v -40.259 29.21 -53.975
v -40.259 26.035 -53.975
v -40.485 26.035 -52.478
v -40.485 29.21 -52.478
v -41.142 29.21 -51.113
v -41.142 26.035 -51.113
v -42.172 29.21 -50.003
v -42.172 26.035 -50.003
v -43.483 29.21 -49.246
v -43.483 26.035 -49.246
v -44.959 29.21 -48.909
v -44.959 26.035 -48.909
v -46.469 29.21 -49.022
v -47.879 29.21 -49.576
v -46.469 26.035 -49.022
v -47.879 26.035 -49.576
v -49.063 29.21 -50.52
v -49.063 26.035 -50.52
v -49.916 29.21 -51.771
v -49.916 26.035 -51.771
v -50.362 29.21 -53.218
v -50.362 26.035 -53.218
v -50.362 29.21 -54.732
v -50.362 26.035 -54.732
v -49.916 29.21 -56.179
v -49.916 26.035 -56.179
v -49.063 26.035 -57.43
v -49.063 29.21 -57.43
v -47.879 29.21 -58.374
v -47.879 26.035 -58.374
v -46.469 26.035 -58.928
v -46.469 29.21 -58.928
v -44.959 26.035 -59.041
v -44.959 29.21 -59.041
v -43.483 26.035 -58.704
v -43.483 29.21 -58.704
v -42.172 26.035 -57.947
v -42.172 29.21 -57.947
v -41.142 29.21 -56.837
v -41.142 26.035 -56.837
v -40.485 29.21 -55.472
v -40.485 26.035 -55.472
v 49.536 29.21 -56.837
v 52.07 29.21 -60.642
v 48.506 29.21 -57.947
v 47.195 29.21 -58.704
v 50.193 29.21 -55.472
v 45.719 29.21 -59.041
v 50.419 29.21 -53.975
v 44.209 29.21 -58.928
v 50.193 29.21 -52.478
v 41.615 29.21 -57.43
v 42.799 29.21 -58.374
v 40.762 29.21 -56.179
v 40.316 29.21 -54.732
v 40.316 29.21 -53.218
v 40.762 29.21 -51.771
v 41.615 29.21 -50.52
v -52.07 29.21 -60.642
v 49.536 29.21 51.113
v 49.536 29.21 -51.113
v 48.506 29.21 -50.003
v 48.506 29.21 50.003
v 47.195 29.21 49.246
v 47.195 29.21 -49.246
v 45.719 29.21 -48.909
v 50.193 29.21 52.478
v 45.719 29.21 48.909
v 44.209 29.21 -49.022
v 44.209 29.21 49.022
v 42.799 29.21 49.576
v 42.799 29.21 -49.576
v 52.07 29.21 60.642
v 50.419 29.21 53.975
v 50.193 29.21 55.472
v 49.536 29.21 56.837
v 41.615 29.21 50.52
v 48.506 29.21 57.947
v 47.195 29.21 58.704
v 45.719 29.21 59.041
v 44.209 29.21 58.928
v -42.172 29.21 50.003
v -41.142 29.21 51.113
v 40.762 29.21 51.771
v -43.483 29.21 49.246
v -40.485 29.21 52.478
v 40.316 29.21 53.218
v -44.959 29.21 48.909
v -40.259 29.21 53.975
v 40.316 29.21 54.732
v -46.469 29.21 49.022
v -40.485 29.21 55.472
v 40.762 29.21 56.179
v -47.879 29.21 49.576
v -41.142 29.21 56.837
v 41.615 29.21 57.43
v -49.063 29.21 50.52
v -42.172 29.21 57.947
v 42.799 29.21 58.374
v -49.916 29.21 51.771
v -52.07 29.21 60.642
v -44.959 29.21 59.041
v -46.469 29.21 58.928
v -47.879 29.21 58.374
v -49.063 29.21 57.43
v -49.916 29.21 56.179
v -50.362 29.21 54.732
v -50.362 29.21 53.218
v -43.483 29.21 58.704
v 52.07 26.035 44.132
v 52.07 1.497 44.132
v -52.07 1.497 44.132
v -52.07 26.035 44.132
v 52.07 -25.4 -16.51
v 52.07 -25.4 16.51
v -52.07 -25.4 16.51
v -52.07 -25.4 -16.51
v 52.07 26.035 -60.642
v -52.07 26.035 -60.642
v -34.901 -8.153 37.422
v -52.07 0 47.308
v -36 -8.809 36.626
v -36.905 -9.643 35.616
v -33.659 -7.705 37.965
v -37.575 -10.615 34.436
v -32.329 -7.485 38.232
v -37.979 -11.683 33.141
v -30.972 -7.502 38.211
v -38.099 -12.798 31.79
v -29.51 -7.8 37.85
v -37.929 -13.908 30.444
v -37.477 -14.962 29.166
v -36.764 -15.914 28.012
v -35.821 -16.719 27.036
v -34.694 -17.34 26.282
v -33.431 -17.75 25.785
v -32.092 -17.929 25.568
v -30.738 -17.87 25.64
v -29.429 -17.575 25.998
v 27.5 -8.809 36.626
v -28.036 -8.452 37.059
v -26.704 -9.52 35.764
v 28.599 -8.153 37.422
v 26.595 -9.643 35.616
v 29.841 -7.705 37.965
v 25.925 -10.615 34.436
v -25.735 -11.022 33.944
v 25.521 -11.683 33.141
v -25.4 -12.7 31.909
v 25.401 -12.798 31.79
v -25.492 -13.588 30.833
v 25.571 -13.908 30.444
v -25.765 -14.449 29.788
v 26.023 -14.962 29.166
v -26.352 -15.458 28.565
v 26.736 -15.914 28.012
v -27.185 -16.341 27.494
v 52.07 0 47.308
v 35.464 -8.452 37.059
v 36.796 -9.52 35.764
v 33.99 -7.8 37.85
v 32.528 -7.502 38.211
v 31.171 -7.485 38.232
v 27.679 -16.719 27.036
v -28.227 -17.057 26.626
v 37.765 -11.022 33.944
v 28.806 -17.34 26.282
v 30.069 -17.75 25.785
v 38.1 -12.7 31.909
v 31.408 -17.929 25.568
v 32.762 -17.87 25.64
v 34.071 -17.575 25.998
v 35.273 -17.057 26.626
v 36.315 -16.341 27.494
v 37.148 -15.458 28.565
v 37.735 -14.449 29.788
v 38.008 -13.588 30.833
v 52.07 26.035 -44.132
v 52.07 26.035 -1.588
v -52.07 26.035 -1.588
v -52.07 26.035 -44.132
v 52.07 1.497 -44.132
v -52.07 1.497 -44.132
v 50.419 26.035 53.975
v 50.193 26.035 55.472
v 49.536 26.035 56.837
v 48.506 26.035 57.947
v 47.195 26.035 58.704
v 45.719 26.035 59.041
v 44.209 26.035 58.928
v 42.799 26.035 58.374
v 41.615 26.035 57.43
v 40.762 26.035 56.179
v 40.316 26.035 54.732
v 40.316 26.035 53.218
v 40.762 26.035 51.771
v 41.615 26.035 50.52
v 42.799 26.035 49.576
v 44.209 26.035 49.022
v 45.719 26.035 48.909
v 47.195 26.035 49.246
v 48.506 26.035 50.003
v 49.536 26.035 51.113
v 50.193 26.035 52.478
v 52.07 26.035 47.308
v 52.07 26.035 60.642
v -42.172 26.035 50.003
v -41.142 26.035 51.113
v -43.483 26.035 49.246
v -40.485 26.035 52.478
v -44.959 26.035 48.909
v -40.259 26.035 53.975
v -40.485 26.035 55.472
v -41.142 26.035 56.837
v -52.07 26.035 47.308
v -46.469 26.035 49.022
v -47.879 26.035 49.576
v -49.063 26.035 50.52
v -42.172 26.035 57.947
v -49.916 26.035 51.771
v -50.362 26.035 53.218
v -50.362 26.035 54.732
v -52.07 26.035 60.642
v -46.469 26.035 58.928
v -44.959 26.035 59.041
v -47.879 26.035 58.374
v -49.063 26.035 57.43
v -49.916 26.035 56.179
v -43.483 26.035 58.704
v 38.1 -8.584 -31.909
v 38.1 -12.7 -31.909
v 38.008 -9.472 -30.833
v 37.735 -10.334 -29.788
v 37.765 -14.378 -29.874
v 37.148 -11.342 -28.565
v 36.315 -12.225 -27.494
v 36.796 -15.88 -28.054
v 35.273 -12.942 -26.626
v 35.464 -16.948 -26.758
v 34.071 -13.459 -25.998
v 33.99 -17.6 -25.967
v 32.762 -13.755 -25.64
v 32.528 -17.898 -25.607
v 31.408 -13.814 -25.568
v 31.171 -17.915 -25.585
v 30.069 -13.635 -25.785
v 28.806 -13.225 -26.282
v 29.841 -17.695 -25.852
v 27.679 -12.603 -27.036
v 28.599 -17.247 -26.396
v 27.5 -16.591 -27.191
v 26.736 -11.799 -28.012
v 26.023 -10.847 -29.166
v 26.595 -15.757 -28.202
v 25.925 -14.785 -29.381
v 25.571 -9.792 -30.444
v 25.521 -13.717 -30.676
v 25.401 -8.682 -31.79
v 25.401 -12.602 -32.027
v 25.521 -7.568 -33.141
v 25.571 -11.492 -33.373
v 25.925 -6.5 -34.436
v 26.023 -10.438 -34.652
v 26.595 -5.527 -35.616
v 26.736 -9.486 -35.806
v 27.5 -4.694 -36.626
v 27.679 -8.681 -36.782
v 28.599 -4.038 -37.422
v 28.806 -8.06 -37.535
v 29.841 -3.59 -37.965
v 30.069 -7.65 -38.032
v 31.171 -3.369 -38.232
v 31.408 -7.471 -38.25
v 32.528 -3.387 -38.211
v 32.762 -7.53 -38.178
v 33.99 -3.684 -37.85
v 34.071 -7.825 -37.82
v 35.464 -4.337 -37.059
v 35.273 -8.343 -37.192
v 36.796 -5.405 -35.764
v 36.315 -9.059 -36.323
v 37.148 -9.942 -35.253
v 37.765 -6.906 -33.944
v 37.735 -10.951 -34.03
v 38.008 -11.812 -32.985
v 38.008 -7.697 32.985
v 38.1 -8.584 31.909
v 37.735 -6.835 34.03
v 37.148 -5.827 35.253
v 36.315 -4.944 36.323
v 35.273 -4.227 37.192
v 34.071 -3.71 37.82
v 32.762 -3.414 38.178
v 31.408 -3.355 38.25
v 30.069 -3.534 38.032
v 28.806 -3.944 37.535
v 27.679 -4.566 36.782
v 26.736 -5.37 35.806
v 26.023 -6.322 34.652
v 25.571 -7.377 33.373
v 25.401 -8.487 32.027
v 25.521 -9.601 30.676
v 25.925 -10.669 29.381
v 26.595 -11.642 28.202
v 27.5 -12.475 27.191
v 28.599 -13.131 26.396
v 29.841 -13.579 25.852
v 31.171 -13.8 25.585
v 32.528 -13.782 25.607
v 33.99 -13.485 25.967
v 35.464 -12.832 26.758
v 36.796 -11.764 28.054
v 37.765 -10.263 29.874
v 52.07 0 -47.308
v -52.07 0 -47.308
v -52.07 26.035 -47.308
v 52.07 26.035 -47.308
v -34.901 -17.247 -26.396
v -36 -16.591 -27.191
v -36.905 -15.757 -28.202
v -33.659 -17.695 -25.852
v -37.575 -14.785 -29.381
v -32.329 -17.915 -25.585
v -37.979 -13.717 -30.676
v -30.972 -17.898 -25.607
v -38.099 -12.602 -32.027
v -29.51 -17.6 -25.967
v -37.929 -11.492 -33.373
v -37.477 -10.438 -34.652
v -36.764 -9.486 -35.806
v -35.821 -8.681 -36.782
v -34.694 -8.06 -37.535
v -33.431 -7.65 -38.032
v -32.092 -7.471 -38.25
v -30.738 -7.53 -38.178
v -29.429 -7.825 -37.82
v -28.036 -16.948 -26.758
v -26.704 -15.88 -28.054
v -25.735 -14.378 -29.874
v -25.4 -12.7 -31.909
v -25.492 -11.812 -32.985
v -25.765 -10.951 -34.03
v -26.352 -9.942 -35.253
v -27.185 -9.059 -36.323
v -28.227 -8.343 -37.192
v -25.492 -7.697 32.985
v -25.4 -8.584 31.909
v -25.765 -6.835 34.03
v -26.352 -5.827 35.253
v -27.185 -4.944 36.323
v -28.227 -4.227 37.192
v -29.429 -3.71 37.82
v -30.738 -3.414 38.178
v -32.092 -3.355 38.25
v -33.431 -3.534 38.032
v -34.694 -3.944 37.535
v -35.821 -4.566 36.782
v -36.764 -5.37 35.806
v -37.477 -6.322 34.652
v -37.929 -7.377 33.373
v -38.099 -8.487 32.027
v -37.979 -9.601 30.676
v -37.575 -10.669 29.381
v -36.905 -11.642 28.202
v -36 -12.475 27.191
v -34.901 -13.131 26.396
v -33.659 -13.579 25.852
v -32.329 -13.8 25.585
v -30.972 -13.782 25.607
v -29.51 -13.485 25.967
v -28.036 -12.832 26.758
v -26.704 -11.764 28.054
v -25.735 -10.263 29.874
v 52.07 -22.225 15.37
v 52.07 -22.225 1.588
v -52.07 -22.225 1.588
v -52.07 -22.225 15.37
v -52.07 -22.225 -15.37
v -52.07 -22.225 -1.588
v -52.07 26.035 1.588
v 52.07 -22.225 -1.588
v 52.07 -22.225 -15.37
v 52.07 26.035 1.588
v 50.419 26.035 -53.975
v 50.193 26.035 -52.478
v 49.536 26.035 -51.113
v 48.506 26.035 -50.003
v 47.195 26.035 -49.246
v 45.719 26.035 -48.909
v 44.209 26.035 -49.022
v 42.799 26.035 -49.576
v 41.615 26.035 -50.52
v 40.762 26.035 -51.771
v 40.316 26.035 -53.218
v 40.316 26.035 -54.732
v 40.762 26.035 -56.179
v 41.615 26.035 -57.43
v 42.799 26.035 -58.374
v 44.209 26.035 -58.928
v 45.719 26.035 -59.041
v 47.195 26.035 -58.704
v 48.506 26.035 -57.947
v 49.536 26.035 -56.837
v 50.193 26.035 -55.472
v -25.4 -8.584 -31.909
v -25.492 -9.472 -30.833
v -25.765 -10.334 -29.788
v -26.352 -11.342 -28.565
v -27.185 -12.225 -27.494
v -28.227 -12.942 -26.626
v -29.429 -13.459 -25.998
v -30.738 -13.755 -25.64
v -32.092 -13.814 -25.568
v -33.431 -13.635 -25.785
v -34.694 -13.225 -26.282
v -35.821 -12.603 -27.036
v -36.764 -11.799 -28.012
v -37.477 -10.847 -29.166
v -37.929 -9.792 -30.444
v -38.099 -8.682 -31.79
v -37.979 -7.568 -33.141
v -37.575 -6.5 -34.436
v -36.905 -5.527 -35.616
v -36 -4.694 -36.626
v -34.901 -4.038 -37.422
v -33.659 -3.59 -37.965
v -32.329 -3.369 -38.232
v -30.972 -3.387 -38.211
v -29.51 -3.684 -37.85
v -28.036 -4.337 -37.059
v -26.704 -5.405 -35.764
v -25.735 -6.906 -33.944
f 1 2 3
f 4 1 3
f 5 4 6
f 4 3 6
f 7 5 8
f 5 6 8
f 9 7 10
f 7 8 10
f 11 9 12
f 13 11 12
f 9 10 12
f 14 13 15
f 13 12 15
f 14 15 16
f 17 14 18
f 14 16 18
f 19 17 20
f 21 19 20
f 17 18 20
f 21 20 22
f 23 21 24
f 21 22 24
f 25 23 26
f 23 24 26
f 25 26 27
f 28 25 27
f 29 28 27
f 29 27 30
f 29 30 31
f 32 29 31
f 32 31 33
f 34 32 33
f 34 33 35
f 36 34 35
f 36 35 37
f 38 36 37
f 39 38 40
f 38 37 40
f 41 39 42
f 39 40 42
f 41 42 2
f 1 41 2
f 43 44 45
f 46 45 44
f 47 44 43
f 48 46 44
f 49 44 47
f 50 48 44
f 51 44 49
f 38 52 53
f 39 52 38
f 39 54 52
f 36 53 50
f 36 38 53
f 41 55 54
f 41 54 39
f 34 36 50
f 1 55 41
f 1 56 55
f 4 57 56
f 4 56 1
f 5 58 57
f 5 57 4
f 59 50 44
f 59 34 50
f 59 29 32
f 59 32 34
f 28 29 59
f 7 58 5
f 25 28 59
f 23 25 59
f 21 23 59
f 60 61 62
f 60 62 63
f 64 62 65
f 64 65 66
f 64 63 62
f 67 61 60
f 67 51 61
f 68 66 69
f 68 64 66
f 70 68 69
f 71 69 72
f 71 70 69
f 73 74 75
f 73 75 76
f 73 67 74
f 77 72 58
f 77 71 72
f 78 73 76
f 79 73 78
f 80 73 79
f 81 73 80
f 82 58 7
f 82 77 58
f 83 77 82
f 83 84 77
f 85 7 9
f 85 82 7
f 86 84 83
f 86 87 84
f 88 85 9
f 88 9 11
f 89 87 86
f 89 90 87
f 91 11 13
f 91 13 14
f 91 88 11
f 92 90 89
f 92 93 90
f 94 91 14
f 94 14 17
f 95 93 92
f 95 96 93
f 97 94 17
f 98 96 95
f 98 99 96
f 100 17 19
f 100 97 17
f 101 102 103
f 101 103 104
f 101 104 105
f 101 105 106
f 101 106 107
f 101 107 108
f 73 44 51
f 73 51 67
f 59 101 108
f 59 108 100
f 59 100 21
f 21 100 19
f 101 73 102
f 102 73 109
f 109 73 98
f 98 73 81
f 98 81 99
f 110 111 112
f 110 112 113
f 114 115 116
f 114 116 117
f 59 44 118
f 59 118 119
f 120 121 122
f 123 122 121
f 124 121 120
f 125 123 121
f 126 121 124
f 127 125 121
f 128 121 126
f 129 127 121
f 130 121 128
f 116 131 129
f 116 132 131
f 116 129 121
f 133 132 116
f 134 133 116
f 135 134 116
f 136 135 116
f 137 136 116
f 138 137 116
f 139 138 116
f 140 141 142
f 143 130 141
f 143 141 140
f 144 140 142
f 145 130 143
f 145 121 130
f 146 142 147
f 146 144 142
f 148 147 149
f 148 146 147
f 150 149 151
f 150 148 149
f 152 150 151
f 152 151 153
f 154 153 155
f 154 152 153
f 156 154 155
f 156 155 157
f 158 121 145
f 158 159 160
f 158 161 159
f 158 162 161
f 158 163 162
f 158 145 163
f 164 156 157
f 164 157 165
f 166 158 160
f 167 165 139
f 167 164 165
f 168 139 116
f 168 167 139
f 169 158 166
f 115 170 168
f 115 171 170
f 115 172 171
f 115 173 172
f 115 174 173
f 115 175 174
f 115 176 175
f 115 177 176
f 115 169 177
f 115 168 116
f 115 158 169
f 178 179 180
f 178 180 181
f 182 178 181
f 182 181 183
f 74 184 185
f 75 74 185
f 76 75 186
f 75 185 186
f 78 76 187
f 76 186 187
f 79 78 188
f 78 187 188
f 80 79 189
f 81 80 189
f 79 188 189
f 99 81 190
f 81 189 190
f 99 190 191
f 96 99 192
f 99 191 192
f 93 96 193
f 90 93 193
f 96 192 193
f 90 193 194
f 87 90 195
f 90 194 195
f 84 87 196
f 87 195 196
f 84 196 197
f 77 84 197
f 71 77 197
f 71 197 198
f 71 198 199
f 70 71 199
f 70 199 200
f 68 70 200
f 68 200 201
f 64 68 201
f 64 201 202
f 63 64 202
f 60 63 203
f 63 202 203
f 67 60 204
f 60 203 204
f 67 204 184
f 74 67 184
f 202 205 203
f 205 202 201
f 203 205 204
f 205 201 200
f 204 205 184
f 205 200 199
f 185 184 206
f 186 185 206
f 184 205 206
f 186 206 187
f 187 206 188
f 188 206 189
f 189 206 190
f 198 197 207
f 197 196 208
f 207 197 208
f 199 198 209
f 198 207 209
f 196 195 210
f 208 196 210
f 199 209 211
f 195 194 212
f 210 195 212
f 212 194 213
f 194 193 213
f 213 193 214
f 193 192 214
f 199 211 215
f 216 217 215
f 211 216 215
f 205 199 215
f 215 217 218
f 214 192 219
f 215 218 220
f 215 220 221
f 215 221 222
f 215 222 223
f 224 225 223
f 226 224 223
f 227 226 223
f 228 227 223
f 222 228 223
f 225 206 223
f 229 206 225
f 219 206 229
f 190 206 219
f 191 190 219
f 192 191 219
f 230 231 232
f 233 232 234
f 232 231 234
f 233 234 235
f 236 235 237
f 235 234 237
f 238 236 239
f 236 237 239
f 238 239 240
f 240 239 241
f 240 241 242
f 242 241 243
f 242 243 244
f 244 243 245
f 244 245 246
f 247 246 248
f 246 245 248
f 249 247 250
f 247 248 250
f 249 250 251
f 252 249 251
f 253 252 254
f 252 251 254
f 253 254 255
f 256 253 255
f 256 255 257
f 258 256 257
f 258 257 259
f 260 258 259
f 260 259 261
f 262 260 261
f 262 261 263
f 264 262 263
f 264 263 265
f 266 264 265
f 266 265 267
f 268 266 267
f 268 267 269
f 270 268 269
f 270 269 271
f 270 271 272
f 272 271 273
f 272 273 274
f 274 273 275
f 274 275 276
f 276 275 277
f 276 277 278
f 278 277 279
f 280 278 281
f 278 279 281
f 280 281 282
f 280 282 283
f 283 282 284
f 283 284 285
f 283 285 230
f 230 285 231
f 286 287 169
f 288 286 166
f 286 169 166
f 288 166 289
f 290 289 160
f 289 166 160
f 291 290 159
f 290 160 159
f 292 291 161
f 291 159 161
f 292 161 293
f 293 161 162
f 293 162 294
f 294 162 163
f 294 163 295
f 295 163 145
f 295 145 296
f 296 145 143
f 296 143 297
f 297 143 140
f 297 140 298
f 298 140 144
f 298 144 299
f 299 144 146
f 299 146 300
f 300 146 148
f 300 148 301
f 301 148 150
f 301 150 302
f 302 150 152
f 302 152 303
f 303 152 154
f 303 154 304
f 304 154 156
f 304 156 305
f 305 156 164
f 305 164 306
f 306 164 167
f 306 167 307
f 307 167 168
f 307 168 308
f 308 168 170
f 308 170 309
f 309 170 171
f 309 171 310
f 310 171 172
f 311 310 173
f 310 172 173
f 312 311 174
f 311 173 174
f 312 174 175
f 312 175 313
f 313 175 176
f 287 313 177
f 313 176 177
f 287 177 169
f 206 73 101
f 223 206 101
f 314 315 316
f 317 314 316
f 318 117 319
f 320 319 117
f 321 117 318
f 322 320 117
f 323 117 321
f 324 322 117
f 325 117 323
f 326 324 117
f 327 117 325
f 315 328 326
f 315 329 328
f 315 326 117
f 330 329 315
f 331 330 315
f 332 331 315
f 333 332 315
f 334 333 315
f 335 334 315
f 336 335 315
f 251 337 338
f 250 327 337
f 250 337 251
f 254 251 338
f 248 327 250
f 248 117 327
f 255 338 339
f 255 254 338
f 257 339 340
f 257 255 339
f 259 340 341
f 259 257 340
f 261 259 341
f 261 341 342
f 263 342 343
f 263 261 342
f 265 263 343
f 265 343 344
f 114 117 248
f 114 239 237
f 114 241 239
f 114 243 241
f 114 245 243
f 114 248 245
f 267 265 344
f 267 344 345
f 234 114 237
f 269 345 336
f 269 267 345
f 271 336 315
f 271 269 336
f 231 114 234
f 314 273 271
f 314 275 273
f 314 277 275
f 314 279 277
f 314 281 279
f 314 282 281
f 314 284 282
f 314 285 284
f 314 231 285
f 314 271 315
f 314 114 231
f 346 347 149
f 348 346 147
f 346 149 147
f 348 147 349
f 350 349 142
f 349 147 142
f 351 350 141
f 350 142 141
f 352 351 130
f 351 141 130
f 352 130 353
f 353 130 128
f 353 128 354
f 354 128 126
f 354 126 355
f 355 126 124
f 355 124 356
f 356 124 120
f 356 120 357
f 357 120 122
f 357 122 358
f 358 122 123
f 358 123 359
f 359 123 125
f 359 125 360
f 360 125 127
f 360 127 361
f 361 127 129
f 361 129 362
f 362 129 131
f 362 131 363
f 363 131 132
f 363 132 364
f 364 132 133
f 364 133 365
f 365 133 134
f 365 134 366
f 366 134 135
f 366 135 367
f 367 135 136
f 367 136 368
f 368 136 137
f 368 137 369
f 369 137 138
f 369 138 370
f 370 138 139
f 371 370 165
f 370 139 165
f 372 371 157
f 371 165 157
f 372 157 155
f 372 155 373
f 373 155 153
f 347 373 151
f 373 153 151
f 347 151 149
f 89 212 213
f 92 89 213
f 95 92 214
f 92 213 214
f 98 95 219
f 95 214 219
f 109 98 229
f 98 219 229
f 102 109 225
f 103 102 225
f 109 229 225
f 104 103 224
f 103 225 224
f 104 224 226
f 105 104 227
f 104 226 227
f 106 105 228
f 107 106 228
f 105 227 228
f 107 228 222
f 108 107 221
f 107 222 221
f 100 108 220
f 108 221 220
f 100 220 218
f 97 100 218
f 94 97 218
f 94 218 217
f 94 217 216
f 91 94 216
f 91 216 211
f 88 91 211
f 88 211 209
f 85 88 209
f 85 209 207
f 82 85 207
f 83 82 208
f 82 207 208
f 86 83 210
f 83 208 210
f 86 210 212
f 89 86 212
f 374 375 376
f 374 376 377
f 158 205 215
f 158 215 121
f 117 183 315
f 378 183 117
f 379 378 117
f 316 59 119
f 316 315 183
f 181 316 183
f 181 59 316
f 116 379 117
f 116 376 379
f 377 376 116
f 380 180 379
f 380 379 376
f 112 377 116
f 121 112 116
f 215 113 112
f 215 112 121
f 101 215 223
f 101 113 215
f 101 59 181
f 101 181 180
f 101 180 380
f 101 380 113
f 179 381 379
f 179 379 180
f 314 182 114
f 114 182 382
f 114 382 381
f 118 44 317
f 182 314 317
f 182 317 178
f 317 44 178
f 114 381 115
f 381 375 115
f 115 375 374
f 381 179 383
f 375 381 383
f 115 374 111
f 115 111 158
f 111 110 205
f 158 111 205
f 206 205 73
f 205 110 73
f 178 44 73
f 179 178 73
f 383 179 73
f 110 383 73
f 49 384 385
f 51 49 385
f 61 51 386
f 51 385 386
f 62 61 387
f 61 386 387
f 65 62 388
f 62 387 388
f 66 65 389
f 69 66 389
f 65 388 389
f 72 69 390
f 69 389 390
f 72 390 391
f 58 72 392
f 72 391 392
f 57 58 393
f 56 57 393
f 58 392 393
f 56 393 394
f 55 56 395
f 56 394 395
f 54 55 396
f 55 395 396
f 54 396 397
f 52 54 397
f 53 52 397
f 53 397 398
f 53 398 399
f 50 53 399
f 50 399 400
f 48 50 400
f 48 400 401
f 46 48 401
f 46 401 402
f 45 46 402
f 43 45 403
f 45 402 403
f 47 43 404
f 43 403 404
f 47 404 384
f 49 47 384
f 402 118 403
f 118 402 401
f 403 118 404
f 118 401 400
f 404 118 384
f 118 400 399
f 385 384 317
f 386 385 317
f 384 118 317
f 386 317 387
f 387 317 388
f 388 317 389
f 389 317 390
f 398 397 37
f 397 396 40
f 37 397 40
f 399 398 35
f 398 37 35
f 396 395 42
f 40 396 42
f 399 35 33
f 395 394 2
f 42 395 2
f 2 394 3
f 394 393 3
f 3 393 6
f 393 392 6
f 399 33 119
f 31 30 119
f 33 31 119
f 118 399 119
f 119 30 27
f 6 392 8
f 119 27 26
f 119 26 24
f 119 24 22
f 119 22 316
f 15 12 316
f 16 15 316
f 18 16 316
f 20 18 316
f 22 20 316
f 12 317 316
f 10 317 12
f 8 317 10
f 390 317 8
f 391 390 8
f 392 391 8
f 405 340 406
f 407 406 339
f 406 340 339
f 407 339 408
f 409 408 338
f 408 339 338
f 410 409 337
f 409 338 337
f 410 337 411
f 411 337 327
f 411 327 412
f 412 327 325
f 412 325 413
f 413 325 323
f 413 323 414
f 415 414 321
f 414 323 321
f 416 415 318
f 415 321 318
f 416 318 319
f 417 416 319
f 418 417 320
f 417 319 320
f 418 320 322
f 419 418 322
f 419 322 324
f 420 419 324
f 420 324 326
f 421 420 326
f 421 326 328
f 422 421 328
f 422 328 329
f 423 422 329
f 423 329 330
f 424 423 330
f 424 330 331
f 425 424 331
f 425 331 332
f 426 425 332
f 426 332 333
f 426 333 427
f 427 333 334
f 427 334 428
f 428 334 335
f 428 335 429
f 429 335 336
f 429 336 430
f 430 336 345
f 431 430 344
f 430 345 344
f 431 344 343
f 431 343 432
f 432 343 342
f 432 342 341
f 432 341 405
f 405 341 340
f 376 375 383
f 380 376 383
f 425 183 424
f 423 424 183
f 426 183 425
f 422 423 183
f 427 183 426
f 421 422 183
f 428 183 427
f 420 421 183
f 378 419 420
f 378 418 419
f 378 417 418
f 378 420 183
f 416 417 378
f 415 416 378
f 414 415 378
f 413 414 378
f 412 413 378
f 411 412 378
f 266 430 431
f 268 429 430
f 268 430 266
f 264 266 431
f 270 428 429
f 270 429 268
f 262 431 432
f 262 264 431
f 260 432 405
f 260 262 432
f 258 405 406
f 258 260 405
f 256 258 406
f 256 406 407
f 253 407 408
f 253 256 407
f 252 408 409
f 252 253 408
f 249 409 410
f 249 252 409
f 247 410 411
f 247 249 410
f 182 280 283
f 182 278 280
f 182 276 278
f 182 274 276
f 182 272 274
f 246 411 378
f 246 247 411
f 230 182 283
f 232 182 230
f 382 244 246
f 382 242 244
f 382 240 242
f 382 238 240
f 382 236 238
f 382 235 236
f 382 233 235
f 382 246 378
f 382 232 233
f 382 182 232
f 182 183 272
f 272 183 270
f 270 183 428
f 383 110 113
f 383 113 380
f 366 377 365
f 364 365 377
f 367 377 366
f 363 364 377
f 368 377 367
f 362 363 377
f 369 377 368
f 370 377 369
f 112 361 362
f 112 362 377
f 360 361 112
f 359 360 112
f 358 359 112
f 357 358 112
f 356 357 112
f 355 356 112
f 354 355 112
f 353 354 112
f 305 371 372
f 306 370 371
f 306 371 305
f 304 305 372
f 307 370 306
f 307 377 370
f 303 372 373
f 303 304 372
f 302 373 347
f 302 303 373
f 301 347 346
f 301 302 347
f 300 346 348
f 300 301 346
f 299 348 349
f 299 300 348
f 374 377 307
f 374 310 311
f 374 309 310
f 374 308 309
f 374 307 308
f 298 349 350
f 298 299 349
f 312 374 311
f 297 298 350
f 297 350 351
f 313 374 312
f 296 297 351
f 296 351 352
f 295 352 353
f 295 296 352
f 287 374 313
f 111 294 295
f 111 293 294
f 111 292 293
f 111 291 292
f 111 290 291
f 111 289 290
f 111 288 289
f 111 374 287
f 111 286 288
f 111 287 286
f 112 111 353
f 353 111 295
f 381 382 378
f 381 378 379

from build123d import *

# Parameters (mm, degrees)
F1_DEPTH      = 52.07
F1_DEPTH_BACK = 52.07
F2_W          = 48.26
F2_H          = 3.175
F3_DEPTH      = 104.14
F4_W          = 104.14
F4_H          = 13.335
F5_DEPTH      = 3.175
F6_R          = 5.08
F7_DEPTH      = 3.175
F8_R          = 6.35
F9_DEPTH      = 51.435


with BuildPart() as f1:
    # F0 (on Right) → F1 (new body, two sides)
    with BuildSketch(Plane.YZ) as f1_sk:
        Polygon((29.21, 0), (29.21, 47.3075), (0, 47.3075), (-25.4, 16.51), (-25.4, 0), (-25.4, -16.51), (0, -47.3075), (29.21, -47.3075), align=None)
        Polygon((-22.225, 0), (-22.225, 3.175), (-22.225, 15.369625), (1.496958, 44.1325), (26.035, 44.1325), (26.035, 3.175), (26.035, 0), (26.035, -3.175), (26.035, -44.1325), (1.496958, -44.1325), (-22.225, -15.369625), (-22.225, -3.175), align=None, mode=Mode.SUBTRACT)
    extrude(amount=F1_DEPTH)
    extrude(f1_sk.sketch, amount=-F1_DEPTH_BACK)

    # F2 (on face) → F3 (join, through all)
    with BuildSketch(Plane.YZ.offset(52.07)):
        with Locations((1.905, 0)):
            Rectangle(F2_W, F2_H)
    extrude(amount=-F3_DEPTH)

    # F4 (on face) → F5 (join)
    with BuildSketch(Plane(origin=(0, 29.21, 0), x_dir=(-1, 0, 0), z_dir=(0, 1, 0))):
        with Locations((0, 53.975)):
            Rectangle(F4_W, F4_H)
        with Locations((0, -53.975)):
            Rectangle(F4_W, F4_H)
    extrude(amount=-F5_DEPTH)

    # F6 (on face) → F7 (cut, through all)
    with BuildSketch(Plane.XZ.offset(-26.035)):
        with Locations((-45.339, 53.975)):
            Circle(F6_R)
        with Locations((45.339, 53.975)):
            Circle(F6_R)
        with Locations((45.339, -53.975)):
            Circle(F6_R)
        with Locations((-45.339, -53.975)):
            Circle(F6_R)
    extrude(amount=-F7_DEPTH, mode=Mode.SUBTRACT)

    # F8 (on face) → F9 (cut, through all)
    with BuildSketch(Plane.XZ.offset(25.4)):
        with Locations((-31.75, 31.90875)):
            Circle(F8_R)
        with Locations((31.75, 31.90875)):
            Circle(F8_R)
        with Locations((31.75, -31.90875)):
            Circle(F8_R)
        with Locations((-31.75, -31.90875)):
            Circle(F8_R)
    extrude(amount=-F9_DEPTH, mode=Mode.SUBTRACT)


solid = f1.part
